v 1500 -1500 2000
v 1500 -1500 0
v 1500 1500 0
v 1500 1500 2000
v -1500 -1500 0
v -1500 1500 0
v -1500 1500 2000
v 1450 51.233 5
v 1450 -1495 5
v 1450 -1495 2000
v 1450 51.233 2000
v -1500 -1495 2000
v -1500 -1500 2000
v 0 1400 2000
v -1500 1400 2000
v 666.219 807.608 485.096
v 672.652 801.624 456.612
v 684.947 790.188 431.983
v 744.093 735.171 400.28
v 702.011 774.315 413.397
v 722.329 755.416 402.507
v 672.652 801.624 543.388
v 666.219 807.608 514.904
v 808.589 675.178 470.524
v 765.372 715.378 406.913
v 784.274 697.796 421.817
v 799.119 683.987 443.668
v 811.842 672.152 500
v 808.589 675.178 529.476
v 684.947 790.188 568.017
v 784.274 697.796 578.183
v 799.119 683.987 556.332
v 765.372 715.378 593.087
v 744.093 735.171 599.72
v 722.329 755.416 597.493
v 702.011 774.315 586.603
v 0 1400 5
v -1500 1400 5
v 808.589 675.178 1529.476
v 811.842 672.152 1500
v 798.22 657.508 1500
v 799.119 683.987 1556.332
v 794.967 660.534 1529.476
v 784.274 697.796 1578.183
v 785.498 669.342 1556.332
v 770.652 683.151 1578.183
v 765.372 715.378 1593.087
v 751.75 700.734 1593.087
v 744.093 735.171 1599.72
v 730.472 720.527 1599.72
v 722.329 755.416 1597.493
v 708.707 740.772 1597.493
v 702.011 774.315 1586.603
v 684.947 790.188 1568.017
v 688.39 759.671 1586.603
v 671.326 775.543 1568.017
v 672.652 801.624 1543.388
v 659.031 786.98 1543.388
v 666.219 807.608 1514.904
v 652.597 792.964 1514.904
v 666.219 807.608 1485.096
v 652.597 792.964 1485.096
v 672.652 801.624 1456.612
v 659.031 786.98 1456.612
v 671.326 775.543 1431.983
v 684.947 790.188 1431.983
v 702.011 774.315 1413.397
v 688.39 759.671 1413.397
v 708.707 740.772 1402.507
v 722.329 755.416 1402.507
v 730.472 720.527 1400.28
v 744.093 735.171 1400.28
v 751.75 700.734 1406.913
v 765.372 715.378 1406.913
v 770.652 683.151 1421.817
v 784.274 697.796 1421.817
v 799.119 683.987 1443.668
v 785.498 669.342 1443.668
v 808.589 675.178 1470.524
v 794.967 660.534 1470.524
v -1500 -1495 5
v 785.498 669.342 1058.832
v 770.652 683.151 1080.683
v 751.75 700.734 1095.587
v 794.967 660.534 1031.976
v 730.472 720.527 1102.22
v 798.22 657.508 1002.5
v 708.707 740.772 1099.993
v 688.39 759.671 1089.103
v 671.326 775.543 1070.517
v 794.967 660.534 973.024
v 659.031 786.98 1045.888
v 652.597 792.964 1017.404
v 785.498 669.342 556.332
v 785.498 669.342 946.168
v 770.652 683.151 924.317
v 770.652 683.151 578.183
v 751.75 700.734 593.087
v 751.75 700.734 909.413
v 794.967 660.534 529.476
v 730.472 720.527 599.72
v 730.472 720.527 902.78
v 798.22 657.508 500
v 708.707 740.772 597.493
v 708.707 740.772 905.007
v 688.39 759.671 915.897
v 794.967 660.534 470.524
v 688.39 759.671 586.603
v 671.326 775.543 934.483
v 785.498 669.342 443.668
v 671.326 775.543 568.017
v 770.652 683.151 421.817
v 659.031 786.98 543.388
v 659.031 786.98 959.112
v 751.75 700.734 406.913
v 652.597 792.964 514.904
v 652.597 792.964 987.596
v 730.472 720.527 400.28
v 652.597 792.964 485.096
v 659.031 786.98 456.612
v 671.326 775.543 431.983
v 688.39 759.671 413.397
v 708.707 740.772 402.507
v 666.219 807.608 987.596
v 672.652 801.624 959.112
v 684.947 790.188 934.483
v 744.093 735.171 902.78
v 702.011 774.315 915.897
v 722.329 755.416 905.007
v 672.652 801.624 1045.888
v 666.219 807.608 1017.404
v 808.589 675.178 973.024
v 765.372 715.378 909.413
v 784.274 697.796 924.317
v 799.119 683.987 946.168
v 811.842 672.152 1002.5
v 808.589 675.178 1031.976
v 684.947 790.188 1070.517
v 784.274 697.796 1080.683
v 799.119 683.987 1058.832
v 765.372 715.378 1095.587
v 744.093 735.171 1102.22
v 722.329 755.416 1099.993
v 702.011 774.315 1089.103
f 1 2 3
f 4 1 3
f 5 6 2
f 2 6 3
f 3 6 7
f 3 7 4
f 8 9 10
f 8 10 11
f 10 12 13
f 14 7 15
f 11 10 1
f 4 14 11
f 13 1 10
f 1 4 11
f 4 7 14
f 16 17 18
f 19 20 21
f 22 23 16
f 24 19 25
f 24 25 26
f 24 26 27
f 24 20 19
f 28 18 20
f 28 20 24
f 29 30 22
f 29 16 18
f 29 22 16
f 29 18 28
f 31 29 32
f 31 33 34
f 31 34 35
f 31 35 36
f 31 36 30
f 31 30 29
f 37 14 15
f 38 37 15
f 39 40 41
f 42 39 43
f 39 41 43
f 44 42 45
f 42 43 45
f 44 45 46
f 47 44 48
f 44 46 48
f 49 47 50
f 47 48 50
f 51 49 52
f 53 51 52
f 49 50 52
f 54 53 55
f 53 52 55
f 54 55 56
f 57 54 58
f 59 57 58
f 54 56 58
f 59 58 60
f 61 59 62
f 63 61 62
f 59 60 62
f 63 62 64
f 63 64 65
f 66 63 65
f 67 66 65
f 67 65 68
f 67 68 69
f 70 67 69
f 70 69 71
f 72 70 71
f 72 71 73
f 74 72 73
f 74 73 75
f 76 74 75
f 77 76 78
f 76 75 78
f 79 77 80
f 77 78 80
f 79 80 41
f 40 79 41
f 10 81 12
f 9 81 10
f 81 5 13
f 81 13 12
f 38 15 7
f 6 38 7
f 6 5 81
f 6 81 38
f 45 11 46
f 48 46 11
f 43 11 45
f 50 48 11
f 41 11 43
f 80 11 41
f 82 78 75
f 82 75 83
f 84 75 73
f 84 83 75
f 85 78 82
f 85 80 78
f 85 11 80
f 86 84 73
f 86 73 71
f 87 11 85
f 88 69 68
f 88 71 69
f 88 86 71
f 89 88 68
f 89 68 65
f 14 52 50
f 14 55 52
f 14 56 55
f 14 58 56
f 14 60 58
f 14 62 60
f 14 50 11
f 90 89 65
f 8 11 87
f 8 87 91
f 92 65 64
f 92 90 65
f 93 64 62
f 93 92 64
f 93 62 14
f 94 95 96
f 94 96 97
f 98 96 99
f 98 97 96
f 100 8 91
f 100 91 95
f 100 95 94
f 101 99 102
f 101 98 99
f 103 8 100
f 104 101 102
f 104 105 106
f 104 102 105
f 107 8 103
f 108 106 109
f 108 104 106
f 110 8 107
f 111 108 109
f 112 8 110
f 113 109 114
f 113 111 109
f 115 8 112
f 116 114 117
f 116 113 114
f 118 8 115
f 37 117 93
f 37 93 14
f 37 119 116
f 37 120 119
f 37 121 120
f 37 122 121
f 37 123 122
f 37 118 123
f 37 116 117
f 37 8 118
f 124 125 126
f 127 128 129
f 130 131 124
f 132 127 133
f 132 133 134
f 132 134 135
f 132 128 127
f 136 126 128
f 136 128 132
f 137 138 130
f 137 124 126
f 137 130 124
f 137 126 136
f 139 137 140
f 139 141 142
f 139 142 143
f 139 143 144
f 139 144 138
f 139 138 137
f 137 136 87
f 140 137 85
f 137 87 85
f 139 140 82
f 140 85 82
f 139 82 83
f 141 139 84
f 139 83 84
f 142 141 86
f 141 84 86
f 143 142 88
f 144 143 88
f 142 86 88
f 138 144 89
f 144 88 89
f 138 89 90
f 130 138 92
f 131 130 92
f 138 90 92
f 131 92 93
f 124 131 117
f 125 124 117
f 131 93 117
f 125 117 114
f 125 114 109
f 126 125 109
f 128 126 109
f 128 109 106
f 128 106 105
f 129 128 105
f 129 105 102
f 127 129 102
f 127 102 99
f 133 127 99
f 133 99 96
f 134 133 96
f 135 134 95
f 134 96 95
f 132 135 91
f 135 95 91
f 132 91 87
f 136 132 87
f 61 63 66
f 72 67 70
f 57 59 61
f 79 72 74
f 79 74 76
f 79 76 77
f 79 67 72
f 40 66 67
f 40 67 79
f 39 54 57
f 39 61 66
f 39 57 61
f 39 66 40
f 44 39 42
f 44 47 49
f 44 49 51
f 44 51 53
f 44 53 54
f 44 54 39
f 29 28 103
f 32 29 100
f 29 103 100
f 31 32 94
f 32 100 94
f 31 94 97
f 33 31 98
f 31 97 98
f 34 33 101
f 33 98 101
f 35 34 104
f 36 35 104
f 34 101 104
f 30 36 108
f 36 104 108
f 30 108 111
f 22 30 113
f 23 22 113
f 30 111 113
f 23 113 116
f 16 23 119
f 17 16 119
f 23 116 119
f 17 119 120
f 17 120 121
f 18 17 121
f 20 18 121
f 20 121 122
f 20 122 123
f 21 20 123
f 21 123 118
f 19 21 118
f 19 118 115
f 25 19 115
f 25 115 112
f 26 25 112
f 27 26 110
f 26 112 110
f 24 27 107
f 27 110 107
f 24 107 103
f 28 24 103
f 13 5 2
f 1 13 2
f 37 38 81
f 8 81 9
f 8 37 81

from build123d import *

# Parameters (mm, degrees)
SKETCH1_W               = 3000
SKETCH1_H               = 3000
BOSS_EXTRUDE1_DEPTH     = 2000
CUT_EXTRUDE4_DEPTH      = 2916.475947423
CUT_EXTRUDE4_DEPTH_BACK = 1995
SKETCH3_R               = 100
CUT_EXTRUDE5_DEPTH      = 20


with BuildPart() as part:
    # Sketch1 → Boss-Extrude1 (new body)
    with BuildSketch(Plane.XY):
        Rectangle(SKETCH1_W, SKETCH1_H)
    extrude(amount=BOSS_EXTRUDE1_DEPTH)

    # Sketch2 → Cut-Extrude4 (cut, two sides: drawn at the far end of the back side and taken through both)
    with BuildSketch(Plane.XY.offset(2000).offset(-CUT_EXTRUDE4_DEPTH_BACK)):
        Polygon((0, 1400), (-1500, 1400), (-1500, -1495), (-950, -1495), (1450, -1495), (1450, 51.232739989), align=None)
    extrude(amount=CUT_EXTRUDE4_DEPTH + CUT_EXTRUDE4_DEPTH_BACK, mode=Mode.SUBTRACT)

    # Sketch3 → Cut-Extrude5 (cut)
    with BuildSketch(Plane(origin=(698.170768667, 750.572500224, 0), x_dir=(0.7322043529273712, -0.6810850061146625, 0), z_dir=(-0.6810850061146625, -0.7322043529273712, 0))):
        with Locations((36.641726078, 1500)):
            Circle(SKETCH3_R)
        with Locations((36.641726078, 1002.5)):
            Circle(SKETCH3_R)
        with Locations((36.641726078, 500)):
            Circle(SKETCH3_R)
    extrude(amount=-CUT_EXTRUDE5_DEPTH, mode=Mode.SUBTRACT)


solid = part.part
